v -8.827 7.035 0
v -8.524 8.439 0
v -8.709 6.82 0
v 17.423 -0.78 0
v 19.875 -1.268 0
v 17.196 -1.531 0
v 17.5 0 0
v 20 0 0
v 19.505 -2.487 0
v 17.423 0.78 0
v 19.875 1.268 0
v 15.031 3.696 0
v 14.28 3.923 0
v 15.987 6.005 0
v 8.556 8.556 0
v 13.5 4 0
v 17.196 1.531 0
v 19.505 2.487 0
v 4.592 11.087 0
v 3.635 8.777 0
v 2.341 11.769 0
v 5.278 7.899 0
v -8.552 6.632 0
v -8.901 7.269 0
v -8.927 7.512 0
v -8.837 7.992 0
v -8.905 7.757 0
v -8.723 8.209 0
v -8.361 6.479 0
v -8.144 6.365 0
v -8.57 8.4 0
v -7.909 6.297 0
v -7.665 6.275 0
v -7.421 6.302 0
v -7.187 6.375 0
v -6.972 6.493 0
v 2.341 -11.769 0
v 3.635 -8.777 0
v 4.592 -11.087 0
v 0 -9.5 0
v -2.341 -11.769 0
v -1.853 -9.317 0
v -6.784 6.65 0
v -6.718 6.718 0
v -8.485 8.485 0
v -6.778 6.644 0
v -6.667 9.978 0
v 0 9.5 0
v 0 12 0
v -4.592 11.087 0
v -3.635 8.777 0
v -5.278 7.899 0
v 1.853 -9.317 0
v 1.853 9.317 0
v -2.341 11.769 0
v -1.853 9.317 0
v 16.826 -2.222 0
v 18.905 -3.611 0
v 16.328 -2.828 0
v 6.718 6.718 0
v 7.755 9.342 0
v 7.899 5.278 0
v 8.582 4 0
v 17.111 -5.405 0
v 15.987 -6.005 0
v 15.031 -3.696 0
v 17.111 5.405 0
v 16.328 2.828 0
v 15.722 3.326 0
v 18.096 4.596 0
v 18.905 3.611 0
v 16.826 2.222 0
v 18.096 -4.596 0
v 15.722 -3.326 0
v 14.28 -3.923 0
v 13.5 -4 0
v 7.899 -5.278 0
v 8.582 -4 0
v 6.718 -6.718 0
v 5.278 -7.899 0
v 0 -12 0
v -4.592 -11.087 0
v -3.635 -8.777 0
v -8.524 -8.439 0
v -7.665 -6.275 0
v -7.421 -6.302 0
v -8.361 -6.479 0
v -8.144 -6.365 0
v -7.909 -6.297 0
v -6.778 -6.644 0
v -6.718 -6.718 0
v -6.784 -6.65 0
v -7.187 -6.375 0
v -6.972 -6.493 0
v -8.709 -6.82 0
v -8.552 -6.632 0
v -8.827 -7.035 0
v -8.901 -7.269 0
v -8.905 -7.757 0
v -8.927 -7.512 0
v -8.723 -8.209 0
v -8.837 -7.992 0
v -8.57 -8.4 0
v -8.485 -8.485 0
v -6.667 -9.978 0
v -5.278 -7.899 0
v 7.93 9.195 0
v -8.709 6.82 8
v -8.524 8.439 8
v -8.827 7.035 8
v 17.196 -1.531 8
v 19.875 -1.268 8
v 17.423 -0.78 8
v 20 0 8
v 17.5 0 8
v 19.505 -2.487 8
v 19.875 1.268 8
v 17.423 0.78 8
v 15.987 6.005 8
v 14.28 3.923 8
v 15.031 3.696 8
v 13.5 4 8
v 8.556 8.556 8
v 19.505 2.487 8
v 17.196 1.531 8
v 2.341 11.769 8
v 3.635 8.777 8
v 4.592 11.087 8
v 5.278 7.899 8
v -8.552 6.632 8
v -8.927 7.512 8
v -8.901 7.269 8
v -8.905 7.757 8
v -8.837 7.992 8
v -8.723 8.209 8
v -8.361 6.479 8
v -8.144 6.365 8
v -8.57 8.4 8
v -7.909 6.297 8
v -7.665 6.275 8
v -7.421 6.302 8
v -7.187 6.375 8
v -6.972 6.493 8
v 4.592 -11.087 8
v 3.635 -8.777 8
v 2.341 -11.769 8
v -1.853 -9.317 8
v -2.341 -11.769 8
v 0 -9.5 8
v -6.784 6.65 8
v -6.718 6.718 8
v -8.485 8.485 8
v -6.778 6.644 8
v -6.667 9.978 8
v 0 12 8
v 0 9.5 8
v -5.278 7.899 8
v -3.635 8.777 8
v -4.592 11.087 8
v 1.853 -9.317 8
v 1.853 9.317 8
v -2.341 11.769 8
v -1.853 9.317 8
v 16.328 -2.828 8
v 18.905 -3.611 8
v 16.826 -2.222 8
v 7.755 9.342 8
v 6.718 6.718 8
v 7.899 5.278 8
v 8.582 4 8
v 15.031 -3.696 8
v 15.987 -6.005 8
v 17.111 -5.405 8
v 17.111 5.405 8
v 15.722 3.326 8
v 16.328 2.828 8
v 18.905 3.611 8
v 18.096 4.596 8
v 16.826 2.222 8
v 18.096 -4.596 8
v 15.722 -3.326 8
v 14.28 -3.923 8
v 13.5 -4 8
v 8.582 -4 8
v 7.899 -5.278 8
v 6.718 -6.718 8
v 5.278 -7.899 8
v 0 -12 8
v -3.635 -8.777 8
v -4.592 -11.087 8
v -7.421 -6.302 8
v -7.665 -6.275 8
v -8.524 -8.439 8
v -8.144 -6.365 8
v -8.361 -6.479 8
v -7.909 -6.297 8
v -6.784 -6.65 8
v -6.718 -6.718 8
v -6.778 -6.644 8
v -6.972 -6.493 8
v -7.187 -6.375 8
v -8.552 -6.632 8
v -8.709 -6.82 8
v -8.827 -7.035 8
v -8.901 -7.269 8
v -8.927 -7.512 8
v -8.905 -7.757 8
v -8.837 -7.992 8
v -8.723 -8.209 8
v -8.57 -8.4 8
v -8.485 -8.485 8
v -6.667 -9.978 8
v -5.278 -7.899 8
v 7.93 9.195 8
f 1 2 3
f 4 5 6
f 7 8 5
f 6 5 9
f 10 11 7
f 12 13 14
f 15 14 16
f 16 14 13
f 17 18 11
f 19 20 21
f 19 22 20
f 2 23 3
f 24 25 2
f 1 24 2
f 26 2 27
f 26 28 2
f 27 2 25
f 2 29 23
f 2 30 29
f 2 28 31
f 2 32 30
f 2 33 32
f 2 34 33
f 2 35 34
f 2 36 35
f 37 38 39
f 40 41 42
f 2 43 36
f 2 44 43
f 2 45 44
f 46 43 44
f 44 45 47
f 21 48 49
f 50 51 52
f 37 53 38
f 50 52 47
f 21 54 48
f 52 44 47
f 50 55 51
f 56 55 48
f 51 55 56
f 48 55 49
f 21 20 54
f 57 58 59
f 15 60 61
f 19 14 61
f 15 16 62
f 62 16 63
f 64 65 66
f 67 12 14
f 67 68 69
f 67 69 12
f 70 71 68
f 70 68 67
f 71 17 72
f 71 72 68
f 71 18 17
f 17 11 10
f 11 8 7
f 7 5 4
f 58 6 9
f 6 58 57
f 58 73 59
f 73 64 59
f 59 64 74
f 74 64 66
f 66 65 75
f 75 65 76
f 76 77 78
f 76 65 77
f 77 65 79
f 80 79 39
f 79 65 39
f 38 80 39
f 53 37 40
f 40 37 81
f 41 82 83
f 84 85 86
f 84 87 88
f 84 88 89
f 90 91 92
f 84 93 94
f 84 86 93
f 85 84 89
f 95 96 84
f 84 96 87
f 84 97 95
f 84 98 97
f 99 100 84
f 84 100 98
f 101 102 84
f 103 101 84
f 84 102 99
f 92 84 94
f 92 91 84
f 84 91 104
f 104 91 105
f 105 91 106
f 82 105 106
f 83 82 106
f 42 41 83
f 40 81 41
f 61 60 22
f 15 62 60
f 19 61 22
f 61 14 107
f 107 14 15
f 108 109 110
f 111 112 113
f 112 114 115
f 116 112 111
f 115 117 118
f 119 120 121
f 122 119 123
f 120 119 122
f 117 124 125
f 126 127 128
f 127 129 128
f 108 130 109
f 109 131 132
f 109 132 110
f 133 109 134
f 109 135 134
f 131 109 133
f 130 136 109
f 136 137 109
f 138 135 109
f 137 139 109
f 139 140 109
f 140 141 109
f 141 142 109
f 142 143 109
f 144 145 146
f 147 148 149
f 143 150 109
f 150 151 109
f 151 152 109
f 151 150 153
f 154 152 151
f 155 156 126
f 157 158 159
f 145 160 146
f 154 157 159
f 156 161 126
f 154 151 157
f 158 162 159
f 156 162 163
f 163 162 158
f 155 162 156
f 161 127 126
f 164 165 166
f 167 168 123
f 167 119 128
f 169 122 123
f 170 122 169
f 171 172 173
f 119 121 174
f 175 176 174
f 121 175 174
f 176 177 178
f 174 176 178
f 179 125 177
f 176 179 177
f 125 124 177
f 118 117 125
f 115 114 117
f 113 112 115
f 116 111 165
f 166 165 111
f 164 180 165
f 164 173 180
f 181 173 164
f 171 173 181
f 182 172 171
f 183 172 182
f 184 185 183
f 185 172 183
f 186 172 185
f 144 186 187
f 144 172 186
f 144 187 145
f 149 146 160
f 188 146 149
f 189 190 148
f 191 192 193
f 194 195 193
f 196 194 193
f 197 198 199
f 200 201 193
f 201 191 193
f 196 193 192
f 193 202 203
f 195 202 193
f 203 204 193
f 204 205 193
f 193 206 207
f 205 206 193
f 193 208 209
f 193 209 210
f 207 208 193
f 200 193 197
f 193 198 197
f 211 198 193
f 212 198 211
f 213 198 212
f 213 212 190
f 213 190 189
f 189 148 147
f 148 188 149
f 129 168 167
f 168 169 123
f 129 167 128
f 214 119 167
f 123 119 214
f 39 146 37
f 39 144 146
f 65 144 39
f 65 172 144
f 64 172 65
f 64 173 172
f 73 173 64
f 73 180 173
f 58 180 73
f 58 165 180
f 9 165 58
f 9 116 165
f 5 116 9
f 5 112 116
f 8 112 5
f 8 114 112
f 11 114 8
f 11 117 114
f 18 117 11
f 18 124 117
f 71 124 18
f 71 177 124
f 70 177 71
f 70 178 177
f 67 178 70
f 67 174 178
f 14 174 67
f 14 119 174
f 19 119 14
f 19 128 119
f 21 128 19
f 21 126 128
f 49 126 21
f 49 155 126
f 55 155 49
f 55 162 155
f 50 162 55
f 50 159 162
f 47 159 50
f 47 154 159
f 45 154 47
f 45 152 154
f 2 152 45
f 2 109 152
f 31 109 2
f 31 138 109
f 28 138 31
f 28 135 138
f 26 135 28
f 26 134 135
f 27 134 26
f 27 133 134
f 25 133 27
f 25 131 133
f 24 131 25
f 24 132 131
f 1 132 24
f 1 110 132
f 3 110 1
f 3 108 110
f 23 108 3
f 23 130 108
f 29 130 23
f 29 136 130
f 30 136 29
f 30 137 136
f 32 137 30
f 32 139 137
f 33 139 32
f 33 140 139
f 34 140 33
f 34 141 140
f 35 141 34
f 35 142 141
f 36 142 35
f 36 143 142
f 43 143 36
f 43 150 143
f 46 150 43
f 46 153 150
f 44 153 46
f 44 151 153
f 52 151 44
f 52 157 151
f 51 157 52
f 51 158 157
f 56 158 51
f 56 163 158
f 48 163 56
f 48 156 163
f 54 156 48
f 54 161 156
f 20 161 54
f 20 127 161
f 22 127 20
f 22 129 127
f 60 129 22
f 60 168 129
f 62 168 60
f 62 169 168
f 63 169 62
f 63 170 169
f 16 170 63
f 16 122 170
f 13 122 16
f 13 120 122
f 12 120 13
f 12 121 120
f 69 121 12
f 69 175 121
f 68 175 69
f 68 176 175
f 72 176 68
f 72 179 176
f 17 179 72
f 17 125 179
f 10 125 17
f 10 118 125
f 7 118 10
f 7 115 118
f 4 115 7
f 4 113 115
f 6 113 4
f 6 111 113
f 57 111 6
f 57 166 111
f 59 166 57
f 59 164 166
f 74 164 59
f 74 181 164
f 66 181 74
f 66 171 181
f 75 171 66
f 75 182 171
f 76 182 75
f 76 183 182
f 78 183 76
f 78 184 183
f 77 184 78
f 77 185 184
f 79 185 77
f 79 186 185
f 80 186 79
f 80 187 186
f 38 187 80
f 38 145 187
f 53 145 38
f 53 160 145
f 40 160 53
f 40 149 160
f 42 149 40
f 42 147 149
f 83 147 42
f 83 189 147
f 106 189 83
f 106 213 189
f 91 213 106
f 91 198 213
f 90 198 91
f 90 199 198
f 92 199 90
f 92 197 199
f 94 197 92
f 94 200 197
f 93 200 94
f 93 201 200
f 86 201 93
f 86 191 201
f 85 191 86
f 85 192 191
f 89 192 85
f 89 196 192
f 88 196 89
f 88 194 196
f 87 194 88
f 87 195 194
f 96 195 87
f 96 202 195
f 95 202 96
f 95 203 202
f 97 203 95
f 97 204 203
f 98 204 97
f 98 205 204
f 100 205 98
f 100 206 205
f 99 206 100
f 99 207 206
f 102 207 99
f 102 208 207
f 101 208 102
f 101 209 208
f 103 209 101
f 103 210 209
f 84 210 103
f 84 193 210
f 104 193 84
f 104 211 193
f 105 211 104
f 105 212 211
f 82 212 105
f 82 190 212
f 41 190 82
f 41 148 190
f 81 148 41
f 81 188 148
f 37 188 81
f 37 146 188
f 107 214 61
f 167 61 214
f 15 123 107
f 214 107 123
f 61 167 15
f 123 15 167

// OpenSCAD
// 
// Mic stand cord clip
// version 1.0   8/27/2015
// by daozenciaoyen
//

// preview[view:southwest, tilt:top]

/* [Main] */
// (in mm)
post_diameter = 19 ; // [5:0.5:40]
// (in mm)
cord_diameter = 8 ; // [5:0.5:20]
// extra cord room (in mm)
add_clearance = 0 ; // [0:0.5:10]
// (in mm)
clip_width = 8 ; // [2:2:40]
// (in pct of post diameter)
opening_percent = 0.7 ; // [0.5:0.05:0.95]
// (in mm)
min_thickness = 2.5 ; // [2:0.5:10]

/* [Hidden] */
pd = post_diameter ;
cd = cord_diameter ;
ac = add_clearance ;
cw = clip_width ;
op = opening_percent ;
mt = min_thickness ;

opd = pd+mt*2 ; // outer post diameter
ocd = cd+mt*2 ; // outer cord diameter
pr = pd/2 ; // post radius
cr = cd/2 ; // cord radius
ol = pd*op ; // opening length
oa = asin((ol/2)/pr) ; // opening angle 
ff = .1 ; // fudge factor

$fn = 32 ;

main();

module main()
{
  linear_extrude(height=cw)
    union() {
      difference() {
        hull() {
          circle(d=opd);
          translate([pr+cr+ac,0,0]) circle(d=ocd);
        }
        circle(d=pd);
        translate([pr+cr+ac,0,0]) circle(d=cd);
        translate([0,-cr,0]) square([pr+cr+ac,cd]);
        pie(opd/2,oa*2,180) ;
      }
      rotate([0,0,oa]) translate([-pr-mt/2,0,0]) circle(d=mt);
      rotate([0,0,-oa]) translate([-pr-mt/2,0,0]) circle(d=mt);
    }
}

module pie(r,d,c)
{
  r = r + ff ; // radius
  // d = degrees (0-180)
  // c = angle of center of slice
  echo(d=d);
  rotate([0,0,180+d/2+c])
  difference() {
    intersection() {
      translate([-r,0,0]) square([r*2,r]);
      circle(r+ff);
    }
    rotate([0,0,180-d])
      translate([-r,-r,0]) square([r*2,r]);
  }
}
